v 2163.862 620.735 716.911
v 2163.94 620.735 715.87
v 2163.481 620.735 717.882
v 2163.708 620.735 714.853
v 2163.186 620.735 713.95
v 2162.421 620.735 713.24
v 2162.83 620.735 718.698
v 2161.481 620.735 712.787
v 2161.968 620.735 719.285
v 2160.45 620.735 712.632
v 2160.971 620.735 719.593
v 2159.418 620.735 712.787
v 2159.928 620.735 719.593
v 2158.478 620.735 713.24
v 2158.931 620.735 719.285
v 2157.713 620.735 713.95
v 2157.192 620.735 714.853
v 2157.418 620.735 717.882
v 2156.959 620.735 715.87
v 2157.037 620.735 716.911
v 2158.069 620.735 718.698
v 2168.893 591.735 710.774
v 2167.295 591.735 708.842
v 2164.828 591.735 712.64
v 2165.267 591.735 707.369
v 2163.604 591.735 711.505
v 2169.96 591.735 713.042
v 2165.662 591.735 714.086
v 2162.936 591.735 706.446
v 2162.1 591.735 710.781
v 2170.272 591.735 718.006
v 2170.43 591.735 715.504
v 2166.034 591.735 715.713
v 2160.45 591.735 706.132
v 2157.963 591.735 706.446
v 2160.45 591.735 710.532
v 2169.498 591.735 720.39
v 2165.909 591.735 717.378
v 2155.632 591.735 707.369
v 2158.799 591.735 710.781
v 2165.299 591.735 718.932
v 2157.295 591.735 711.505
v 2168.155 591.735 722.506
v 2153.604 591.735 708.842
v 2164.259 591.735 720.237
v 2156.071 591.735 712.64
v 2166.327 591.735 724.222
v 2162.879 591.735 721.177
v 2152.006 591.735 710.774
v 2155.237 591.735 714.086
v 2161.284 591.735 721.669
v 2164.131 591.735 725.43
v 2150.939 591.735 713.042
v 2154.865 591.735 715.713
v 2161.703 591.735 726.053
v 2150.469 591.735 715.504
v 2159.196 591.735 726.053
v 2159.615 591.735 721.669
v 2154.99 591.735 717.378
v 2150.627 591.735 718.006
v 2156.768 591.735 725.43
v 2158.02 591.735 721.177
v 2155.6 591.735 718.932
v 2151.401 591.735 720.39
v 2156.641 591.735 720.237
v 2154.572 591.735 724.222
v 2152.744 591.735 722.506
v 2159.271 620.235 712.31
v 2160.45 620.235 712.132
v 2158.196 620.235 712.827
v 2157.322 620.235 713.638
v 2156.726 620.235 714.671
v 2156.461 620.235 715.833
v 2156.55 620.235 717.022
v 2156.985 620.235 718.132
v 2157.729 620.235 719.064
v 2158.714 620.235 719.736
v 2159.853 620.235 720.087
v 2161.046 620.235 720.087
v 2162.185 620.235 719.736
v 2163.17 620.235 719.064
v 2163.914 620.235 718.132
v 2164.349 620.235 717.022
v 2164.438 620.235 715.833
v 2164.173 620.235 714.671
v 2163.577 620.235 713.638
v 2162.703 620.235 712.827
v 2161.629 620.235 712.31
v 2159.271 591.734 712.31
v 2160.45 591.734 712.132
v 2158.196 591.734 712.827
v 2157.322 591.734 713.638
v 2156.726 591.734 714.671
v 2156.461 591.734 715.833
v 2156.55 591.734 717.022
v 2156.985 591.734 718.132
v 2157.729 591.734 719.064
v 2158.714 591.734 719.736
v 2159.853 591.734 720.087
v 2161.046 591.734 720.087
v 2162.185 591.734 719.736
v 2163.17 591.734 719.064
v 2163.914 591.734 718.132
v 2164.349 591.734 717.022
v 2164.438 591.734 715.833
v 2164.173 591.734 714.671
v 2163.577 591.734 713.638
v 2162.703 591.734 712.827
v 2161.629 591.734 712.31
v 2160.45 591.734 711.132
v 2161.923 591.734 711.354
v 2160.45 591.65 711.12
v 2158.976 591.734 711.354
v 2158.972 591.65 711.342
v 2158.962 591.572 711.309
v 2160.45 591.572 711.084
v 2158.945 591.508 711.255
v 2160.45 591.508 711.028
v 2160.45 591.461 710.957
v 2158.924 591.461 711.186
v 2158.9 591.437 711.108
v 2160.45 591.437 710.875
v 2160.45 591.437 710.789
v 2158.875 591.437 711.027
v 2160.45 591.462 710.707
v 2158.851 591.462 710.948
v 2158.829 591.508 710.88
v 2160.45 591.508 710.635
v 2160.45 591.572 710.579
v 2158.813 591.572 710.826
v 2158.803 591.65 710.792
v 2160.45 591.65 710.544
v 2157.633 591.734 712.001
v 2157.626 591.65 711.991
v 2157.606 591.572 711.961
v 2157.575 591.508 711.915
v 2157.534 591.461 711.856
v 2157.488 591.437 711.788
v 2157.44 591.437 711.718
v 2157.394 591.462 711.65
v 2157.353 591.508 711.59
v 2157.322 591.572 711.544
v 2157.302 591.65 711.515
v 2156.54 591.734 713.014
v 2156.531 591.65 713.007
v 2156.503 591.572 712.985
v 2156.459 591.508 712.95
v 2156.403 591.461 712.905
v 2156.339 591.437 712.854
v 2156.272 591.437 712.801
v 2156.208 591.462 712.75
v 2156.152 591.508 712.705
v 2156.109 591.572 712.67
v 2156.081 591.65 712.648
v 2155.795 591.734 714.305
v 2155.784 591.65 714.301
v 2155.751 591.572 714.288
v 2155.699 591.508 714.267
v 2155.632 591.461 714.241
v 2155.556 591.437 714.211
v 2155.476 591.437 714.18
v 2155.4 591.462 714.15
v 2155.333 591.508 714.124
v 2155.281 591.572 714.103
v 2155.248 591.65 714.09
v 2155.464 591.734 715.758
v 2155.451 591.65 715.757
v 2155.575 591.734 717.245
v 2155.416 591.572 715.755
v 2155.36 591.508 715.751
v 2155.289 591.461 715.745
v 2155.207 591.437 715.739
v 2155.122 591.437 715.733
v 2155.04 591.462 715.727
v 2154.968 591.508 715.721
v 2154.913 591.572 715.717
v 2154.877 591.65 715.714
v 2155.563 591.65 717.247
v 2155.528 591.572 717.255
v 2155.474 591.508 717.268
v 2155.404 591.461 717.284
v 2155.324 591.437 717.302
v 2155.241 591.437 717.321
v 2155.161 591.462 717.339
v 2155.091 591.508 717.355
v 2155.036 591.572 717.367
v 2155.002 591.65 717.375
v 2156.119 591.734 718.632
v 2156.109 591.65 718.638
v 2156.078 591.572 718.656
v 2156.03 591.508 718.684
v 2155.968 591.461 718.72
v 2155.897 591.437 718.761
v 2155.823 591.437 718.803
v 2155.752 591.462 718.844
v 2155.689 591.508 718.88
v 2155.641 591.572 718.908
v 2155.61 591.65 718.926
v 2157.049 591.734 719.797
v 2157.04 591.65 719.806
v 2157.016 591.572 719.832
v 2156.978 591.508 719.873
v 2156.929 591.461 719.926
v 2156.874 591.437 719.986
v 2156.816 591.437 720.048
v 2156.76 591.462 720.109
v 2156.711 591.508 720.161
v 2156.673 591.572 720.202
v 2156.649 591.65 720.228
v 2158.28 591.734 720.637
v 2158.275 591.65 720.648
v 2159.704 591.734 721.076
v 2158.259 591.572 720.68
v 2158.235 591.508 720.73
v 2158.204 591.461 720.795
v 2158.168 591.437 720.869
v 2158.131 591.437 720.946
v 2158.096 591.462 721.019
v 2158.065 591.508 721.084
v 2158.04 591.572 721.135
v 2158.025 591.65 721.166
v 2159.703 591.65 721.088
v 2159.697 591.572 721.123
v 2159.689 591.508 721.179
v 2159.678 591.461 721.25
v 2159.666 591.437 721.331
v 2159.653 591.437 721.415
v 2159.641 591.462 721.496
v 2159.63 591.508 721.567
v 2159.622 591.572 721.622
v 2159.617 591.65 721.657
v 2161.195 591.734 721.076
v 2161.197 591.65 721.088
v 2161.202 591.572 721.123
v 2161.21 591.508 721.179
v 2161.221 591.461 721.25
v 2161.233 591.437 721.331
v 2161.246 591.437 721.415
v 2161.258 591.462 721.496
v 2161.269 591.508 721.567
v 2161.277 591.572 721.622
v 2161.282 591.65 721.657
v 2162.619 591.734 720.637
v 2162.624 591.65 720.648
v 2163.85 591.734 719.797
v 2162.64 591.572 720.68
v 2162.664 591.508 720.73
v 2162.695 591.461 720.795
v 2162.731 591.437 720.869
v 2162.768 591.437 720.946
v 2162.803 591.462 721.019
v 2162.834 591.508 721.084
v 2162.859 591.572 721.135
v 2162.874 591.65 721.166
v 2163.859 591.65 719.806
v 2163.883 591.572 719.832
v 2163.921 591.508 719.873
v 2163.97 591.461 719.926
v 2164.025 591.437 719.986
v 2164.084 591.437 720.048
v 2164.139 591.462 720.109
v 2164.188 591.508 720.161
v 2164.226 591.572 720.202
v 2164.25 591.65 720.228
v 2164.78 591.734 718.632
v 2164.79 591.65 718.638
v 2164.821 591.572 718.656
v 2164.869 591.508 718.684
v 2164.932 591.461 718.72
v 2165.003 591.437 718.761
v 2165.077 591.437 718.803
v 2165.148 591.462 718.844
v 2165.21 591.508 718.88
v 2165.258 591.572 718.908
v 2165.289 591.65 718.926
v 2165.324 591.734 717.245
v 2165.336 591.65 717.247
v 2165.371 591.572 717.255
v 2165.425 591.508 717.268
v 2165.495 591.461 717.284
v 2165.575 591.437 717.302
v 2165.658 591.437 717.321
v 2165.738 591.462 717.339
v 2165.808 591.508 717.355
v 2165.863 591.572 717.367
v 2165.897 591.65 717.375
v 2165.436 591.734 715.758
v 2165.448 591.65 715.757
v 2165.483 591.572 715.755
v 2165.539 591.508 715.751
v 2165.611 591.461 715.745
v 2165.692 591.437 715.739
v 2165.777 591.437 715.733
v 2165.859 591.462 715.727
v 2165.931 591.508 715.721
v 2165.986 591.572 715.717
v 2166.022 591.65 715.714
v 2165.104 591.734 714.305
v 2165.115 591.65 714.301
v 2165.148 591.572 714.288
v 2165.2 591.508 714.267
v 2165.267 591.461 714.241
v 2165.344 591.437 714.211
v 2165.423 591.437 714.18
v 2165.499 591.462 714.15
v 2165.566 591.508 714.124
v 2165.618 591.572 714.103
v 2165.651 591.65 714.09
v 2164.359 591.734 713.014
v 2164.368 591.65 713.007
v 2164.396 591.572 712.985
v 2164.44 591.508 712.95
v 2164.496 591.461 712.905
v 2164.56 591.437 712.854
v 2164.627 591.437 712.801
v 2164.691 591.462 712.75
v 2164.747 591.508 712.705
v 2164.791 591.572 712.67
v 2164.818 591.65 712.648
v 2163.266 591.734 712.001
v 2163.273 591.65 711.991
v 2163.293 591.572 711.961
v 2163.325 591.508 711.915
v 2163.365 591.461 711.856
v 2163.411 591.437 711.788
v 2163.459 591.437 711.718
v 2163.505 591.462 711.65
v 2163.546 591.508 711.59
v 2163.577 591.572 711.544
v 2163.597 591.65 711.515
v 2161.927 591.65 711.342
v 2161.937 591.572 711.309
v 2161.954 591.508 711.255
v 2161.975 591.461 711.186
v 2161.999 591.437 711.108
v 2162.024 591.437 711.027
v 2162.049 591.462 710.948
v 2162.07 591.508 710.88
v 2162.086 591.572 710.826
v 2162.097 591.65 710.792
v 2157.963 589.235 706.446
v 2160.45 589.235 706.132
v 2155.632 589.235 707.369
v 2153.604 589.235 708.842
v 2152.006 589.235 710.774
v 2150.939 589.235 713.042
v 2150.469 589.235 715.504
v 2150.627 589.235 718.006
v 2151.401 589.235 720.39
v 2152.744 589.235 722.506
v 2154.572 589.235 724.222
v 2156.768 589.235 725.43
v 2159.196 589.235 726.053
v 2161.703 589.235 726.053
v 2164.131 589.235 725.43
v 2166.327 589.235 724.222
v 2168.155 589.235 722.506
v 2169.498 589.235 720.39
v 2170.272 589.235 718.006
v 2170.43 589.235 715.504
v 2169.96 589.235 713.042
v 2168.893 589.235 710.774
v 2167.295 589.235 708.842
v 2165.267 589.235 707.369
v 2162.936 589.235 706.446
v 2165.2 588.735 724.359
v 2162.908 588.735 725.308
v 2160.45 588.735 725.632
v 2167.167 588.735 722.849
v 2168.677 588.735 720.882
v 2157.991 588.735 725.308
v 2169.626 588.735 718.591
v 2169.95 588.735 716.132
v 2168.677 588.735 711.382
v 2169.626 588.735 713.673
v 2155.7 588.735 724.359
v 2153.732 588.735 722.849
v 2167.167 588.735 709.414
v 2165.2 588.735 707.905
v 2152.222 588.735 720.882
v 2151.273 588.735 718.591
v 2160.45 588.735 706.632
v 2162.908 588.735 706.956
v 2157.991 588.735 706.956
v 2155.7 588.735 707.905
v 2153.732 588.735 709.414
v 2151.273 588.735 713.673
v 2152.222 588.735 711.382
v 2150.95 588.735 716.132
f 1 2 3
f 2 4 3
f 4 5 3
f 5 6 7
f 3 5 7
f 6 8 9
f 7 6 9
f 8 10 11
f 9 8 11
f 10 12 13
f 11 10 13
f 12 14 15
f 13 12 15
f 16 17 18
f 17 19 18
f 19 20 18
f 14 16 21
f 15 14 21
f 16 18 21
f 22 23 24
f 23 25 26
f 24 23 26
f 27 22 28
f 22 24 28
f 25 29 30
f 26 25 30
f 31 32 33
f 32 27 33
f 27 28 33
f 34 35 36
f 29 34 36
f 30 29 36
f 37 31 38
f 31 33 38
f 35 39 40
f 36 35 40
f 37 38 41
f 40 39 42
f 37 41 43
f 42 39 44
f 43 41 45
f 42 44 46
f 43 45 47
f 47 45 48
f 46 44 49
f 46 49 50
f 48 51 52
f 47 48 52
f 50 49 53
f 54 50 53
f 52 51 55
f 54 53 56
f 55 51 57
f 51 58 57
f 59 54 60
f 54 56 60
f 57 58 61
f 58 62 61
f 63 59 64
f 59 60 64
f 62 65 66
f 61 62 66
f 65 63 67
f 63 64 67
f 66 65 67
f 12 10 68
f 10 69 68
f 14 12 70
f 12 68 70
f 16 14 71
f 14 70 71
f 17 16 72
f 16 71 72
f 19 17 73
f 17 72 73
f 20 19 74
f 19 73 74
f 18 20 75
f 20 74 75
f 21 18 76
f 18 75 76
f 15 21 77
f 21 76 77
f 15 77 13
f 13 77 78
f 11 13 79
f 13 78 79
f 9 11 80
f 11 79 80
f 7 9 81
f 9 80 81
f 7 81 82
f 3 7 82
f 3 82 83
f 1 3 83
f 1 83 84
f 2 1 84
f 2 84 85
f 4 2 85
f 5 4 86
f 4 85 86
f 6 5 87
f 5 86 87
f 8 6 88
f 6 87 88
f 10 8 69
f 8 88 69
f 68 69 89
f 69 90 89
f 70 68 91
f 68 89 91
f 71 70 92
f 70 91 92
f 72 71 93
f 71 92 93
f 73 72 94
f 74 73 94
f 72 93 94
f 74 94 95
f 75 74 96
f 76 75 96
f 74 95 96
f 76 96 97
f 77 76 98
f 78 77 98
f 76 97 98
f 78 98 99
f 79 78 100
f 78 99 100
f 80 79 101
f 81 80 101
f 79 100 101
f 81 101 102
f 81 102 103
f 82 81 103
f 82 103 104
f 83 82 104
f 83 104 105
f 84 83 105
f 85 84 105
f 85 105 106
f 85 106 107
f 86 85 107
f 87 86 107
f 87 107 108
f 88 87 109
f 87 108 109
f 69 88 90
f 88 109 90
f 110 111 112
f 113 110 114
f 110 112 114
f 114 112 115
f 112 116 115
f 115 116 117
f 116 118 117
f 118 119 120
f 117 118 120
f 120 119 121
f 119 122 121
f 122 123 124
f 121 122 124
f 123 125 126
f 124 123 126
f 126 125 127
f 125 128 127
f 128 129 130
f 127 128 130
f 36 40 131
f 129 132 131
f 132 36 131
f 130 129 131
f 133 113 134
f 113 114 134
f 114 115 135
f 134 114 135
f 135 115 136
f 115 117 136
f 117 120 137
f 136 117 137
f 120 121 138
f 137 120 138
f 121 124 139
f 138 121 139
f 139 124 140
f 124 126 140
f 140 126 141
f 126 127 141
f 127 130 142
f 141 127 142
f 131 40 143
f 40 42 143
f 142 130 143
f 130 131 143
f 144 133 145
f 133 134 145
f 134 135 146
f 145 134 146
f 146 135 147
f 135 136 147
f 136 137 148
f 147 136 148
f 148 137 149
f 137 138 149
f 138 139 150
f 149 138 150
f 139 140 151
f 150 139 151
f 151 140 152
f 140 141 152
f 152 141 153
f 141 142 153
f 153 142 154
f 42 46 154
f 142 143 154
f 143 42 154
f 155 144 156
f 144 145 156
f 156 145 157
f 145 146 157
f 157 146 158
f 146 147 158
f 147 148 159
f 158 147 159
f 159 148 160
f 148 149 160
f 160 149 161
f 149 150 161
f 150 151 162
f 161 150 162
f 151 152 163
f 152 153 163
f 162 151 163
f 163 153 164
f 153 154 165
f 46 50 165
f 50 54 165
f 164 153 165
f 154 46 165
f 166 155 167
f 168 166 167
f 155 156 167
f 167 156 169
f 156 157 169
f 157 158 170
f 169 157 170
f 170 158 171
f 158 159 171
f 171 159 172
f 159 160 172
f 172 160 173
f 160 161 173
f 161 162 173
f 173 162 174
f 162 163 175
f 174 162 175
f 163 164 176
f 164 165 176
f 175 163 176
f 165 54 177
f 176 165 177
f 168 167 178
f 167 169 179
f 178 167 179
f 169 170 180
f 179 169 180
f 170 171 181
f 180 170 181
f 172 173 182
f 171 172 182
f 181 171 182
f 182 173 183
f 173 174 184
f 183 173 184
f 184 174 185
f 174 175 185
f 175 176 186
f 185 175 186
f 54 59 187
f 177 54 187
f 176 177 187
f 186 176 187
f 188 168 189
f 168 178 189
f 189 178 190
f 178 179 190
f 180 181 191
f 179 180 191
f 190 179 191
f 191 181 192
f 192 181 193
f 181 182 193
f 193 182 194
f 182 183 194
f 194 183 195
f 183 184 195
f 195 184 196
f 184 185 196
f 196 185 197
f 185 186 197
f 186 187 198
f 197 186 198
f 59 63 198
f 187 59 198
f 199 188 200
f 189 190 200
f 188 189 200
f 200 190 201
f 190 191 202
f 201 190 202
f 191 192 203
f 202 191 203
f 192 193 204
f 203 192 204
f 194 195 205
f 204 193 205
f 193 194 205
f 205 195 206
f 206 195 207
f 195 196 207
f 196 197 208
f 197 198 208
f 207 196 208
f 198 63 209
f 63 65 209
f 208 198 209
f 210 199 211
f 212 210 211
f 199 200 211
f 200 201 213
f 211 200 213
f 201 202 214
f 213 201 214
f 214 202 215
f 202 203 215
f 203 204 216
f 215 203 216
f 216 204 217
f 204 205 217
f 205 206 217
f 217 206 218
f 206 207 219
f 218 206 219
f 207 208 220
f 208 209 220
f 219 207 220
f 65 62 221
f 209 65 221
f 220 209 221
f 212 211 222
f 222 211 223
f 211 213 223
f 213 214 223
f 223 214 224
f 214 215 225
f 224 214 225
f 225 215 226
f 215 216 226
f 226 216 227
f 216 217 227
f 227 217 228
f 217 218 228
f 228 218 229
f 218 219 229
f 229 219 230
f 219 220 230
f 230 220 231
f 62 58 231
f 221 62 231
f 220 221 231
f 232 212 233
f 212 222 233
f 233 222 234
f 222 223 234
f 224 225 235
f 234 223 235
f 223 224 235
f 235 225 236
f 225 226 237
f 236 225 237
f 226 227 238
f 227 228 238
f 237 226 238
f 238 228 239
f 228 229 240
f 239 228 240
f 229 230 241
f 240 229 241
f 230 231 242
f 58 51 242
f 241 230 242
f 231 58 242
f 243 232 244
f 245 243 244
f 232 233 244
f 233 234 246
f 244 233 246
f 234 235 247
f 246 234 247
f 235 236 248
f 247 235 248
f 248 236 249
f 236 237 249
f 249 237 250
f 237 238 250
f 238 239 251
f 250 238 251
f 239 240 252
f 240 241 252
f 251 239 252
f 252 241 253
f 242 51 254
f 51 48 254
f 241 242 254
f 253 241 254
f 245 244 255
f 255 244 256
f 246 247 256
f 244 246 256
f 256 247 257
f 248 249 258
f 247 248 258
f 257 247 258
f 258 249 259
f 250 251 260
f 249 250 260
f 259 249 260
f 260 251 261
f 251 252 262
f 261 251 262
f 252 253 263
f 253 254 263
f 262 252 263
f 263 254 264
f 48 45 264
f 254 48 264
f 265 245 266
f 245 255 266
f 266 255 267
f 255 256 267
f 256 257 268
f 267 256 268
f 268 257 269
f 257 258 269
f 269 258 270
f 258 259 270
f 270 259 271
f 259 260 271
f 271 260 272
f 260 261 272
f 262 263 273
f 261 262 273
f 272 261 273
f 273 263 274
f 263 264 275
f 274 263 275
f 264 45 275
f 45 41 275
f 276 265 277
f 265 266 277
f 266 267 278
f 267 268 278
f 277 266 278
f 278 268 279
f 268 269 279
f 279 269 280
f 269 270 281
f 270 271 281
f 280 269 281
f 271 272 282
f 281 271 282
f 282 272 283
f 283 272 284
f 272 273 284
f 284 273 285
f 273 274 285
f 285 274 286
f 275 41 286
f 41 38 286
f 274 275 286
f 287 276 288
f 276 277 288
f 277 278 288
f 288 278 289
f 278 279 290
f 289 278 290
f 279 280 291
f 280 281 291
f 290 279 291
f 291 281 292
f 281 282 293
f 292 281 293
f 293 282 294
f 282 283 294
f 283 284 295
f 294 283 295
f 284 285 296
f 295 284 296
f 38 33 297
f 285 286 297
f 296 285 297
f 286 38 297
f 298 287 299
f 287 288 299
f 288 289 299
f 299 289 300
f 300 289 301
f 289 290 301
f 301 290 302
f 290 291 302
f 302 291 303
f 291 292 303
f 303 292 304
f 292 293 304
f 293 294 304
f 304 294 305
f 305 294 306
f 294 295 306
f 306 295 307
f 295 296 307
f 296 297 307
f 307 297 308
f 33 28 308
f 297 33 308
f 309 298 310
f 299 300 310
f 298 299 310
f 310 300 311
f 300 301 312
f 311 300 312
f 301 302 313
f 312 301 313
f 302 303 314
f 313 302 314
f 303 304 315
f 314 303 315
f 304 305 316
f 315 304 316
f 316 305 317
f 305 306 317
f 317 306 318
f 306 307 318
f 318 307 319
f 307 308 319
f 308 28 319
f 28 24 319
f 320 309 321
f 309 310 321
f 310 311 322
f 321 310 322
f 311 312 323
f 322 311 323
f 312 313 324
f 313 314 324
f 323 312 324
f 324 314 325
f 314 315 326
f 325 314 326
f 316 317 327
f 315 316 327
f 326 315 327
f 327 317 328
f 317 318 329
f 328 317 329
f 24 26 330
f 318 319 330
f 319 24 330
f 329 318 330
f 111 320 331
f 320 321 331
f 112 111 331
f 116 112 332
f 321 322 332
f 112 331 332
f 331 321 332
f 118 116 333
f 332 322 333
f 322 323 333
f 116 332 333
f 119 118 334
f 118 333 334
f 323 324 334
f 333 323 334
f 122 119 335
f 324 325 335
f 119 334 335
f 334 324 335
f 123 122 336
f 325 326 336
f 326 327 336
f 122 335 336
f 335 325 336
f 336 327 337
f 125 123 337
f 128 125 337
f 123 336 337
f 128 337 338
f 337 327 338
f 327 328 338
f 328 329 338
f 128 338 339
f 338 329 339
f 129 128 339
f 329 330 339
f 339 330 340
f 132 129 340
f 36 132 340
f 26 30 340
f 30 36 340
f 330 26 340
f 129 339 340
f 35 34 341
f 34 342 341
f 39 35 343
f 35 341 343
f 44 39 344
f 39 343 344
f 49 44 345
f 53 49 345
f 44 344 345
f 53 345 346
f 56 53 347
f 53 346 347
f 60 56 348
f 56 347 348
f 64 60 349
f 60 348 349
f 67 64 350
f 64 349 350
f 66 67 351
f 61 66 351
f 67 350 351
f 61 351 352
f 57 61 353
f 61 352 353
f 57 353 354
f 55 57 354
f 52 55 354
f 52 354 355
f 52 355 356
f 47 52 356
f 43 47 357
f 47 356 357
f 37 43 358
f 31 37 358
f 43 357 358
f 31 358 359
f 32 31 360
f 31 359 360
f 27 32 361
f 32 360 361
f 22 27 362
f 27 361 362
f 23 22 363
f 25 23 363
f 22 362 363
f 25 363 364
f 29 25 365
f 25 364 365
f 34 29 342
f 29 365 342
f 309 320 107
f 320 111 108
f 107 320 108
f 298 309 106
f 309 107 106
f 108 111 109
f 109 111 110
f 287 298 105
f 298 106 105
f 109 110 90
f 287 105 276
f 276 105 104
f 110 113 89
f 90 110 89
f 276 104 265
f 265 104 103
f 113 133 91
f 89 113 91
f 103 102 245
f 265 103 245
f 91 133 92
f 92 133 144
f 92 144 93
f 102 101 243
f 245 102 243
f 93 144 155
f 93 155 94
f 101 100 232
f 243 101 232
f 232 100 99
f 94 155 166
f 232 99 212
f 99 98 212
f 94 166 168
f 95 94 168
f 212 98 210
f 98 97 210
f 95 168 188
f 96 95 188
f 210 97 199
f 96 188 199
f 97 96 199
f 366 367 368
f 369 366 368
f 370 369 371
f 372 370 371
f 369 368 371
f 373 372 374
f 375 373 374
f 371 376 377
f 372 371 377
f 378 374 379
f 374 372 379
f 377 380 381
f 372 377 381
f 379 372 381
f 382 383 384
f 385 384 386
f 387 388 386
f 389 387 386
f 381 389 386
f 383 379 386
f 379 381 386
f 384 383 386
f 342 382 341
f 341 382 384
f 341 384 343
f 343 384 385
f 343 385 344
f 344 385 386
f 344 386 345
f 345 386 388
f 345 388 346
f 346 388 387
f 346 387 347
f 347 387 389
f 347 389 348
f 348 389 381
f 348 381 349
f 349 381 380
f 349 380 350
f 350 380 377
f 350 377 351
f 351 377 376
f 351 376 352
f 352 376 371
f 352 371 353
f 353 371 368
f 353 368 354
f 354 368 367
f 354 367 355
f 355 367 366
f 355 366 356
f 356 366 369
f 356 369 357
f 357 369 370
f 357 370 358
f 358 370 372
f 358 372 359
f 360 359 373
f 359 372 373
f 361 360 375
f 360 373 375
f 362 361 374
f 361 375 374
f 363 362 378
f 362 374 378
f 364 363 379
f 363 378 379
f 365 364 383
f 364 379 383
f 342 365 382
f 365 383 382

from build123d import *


with BuildPart() as part:
    # Esquisse1 → Base-Révolution (revolve)
    with BuildSketch(Plane(origin=(0, 0, 716.131939029), x_dir=(-1, 0, 0), z_dir=(0, 0, -1)), mode=Mode.PRIVATE) as base_r_volution_sk:
        with BuildLine():
            Line((-2169.949576888, 588.734614361), (-2160.449576888, 588.734614361))
            Line((-2160.449576888, 588.734614361), (-2160.449576888, 620.734614361))
            Line((-2160.449576888, 620.734614361), (-2163.949576888, 620.734614361))
            Line((-2163.949576888, 620.734614361), (-2164.449576888, 620.234614361))
            Line((-2164.449576888, 620.234614361), (-2164.449576888, 605.534359442))
            Line((-2164.449576888, 605.534359442), (-2164.449576888, 591.734359161))
            Line((-2164.449576888, 591.734359161), (-2165.449576888, 591.734359161))
            ThreePointArc((-2165.449576888, 591.734359161), (-2165.749653787, 591.434359171), (-2166.049576849, 591.734512958))
            Line((-2166.049576849, 591.734512958), (-2170.449576888, 591.734512958))
            Line((-2170.449576888, 591.734512958), (-2170.449576888, 589.234614361))
            Line((-2170.449576888, 589.234614361), (-2169.949576888, 588.734614361))
        make_face()
    revolve(base_r_volution_sk.sketch.rotate(Axis((2160.449576888, 588.734614361, 716.131939029), (0, 1, 0)), 90), axis=Axis((2160.449576888, 588.734614361, 716.131939029), (0, 1, 0)))


solid = part.part
